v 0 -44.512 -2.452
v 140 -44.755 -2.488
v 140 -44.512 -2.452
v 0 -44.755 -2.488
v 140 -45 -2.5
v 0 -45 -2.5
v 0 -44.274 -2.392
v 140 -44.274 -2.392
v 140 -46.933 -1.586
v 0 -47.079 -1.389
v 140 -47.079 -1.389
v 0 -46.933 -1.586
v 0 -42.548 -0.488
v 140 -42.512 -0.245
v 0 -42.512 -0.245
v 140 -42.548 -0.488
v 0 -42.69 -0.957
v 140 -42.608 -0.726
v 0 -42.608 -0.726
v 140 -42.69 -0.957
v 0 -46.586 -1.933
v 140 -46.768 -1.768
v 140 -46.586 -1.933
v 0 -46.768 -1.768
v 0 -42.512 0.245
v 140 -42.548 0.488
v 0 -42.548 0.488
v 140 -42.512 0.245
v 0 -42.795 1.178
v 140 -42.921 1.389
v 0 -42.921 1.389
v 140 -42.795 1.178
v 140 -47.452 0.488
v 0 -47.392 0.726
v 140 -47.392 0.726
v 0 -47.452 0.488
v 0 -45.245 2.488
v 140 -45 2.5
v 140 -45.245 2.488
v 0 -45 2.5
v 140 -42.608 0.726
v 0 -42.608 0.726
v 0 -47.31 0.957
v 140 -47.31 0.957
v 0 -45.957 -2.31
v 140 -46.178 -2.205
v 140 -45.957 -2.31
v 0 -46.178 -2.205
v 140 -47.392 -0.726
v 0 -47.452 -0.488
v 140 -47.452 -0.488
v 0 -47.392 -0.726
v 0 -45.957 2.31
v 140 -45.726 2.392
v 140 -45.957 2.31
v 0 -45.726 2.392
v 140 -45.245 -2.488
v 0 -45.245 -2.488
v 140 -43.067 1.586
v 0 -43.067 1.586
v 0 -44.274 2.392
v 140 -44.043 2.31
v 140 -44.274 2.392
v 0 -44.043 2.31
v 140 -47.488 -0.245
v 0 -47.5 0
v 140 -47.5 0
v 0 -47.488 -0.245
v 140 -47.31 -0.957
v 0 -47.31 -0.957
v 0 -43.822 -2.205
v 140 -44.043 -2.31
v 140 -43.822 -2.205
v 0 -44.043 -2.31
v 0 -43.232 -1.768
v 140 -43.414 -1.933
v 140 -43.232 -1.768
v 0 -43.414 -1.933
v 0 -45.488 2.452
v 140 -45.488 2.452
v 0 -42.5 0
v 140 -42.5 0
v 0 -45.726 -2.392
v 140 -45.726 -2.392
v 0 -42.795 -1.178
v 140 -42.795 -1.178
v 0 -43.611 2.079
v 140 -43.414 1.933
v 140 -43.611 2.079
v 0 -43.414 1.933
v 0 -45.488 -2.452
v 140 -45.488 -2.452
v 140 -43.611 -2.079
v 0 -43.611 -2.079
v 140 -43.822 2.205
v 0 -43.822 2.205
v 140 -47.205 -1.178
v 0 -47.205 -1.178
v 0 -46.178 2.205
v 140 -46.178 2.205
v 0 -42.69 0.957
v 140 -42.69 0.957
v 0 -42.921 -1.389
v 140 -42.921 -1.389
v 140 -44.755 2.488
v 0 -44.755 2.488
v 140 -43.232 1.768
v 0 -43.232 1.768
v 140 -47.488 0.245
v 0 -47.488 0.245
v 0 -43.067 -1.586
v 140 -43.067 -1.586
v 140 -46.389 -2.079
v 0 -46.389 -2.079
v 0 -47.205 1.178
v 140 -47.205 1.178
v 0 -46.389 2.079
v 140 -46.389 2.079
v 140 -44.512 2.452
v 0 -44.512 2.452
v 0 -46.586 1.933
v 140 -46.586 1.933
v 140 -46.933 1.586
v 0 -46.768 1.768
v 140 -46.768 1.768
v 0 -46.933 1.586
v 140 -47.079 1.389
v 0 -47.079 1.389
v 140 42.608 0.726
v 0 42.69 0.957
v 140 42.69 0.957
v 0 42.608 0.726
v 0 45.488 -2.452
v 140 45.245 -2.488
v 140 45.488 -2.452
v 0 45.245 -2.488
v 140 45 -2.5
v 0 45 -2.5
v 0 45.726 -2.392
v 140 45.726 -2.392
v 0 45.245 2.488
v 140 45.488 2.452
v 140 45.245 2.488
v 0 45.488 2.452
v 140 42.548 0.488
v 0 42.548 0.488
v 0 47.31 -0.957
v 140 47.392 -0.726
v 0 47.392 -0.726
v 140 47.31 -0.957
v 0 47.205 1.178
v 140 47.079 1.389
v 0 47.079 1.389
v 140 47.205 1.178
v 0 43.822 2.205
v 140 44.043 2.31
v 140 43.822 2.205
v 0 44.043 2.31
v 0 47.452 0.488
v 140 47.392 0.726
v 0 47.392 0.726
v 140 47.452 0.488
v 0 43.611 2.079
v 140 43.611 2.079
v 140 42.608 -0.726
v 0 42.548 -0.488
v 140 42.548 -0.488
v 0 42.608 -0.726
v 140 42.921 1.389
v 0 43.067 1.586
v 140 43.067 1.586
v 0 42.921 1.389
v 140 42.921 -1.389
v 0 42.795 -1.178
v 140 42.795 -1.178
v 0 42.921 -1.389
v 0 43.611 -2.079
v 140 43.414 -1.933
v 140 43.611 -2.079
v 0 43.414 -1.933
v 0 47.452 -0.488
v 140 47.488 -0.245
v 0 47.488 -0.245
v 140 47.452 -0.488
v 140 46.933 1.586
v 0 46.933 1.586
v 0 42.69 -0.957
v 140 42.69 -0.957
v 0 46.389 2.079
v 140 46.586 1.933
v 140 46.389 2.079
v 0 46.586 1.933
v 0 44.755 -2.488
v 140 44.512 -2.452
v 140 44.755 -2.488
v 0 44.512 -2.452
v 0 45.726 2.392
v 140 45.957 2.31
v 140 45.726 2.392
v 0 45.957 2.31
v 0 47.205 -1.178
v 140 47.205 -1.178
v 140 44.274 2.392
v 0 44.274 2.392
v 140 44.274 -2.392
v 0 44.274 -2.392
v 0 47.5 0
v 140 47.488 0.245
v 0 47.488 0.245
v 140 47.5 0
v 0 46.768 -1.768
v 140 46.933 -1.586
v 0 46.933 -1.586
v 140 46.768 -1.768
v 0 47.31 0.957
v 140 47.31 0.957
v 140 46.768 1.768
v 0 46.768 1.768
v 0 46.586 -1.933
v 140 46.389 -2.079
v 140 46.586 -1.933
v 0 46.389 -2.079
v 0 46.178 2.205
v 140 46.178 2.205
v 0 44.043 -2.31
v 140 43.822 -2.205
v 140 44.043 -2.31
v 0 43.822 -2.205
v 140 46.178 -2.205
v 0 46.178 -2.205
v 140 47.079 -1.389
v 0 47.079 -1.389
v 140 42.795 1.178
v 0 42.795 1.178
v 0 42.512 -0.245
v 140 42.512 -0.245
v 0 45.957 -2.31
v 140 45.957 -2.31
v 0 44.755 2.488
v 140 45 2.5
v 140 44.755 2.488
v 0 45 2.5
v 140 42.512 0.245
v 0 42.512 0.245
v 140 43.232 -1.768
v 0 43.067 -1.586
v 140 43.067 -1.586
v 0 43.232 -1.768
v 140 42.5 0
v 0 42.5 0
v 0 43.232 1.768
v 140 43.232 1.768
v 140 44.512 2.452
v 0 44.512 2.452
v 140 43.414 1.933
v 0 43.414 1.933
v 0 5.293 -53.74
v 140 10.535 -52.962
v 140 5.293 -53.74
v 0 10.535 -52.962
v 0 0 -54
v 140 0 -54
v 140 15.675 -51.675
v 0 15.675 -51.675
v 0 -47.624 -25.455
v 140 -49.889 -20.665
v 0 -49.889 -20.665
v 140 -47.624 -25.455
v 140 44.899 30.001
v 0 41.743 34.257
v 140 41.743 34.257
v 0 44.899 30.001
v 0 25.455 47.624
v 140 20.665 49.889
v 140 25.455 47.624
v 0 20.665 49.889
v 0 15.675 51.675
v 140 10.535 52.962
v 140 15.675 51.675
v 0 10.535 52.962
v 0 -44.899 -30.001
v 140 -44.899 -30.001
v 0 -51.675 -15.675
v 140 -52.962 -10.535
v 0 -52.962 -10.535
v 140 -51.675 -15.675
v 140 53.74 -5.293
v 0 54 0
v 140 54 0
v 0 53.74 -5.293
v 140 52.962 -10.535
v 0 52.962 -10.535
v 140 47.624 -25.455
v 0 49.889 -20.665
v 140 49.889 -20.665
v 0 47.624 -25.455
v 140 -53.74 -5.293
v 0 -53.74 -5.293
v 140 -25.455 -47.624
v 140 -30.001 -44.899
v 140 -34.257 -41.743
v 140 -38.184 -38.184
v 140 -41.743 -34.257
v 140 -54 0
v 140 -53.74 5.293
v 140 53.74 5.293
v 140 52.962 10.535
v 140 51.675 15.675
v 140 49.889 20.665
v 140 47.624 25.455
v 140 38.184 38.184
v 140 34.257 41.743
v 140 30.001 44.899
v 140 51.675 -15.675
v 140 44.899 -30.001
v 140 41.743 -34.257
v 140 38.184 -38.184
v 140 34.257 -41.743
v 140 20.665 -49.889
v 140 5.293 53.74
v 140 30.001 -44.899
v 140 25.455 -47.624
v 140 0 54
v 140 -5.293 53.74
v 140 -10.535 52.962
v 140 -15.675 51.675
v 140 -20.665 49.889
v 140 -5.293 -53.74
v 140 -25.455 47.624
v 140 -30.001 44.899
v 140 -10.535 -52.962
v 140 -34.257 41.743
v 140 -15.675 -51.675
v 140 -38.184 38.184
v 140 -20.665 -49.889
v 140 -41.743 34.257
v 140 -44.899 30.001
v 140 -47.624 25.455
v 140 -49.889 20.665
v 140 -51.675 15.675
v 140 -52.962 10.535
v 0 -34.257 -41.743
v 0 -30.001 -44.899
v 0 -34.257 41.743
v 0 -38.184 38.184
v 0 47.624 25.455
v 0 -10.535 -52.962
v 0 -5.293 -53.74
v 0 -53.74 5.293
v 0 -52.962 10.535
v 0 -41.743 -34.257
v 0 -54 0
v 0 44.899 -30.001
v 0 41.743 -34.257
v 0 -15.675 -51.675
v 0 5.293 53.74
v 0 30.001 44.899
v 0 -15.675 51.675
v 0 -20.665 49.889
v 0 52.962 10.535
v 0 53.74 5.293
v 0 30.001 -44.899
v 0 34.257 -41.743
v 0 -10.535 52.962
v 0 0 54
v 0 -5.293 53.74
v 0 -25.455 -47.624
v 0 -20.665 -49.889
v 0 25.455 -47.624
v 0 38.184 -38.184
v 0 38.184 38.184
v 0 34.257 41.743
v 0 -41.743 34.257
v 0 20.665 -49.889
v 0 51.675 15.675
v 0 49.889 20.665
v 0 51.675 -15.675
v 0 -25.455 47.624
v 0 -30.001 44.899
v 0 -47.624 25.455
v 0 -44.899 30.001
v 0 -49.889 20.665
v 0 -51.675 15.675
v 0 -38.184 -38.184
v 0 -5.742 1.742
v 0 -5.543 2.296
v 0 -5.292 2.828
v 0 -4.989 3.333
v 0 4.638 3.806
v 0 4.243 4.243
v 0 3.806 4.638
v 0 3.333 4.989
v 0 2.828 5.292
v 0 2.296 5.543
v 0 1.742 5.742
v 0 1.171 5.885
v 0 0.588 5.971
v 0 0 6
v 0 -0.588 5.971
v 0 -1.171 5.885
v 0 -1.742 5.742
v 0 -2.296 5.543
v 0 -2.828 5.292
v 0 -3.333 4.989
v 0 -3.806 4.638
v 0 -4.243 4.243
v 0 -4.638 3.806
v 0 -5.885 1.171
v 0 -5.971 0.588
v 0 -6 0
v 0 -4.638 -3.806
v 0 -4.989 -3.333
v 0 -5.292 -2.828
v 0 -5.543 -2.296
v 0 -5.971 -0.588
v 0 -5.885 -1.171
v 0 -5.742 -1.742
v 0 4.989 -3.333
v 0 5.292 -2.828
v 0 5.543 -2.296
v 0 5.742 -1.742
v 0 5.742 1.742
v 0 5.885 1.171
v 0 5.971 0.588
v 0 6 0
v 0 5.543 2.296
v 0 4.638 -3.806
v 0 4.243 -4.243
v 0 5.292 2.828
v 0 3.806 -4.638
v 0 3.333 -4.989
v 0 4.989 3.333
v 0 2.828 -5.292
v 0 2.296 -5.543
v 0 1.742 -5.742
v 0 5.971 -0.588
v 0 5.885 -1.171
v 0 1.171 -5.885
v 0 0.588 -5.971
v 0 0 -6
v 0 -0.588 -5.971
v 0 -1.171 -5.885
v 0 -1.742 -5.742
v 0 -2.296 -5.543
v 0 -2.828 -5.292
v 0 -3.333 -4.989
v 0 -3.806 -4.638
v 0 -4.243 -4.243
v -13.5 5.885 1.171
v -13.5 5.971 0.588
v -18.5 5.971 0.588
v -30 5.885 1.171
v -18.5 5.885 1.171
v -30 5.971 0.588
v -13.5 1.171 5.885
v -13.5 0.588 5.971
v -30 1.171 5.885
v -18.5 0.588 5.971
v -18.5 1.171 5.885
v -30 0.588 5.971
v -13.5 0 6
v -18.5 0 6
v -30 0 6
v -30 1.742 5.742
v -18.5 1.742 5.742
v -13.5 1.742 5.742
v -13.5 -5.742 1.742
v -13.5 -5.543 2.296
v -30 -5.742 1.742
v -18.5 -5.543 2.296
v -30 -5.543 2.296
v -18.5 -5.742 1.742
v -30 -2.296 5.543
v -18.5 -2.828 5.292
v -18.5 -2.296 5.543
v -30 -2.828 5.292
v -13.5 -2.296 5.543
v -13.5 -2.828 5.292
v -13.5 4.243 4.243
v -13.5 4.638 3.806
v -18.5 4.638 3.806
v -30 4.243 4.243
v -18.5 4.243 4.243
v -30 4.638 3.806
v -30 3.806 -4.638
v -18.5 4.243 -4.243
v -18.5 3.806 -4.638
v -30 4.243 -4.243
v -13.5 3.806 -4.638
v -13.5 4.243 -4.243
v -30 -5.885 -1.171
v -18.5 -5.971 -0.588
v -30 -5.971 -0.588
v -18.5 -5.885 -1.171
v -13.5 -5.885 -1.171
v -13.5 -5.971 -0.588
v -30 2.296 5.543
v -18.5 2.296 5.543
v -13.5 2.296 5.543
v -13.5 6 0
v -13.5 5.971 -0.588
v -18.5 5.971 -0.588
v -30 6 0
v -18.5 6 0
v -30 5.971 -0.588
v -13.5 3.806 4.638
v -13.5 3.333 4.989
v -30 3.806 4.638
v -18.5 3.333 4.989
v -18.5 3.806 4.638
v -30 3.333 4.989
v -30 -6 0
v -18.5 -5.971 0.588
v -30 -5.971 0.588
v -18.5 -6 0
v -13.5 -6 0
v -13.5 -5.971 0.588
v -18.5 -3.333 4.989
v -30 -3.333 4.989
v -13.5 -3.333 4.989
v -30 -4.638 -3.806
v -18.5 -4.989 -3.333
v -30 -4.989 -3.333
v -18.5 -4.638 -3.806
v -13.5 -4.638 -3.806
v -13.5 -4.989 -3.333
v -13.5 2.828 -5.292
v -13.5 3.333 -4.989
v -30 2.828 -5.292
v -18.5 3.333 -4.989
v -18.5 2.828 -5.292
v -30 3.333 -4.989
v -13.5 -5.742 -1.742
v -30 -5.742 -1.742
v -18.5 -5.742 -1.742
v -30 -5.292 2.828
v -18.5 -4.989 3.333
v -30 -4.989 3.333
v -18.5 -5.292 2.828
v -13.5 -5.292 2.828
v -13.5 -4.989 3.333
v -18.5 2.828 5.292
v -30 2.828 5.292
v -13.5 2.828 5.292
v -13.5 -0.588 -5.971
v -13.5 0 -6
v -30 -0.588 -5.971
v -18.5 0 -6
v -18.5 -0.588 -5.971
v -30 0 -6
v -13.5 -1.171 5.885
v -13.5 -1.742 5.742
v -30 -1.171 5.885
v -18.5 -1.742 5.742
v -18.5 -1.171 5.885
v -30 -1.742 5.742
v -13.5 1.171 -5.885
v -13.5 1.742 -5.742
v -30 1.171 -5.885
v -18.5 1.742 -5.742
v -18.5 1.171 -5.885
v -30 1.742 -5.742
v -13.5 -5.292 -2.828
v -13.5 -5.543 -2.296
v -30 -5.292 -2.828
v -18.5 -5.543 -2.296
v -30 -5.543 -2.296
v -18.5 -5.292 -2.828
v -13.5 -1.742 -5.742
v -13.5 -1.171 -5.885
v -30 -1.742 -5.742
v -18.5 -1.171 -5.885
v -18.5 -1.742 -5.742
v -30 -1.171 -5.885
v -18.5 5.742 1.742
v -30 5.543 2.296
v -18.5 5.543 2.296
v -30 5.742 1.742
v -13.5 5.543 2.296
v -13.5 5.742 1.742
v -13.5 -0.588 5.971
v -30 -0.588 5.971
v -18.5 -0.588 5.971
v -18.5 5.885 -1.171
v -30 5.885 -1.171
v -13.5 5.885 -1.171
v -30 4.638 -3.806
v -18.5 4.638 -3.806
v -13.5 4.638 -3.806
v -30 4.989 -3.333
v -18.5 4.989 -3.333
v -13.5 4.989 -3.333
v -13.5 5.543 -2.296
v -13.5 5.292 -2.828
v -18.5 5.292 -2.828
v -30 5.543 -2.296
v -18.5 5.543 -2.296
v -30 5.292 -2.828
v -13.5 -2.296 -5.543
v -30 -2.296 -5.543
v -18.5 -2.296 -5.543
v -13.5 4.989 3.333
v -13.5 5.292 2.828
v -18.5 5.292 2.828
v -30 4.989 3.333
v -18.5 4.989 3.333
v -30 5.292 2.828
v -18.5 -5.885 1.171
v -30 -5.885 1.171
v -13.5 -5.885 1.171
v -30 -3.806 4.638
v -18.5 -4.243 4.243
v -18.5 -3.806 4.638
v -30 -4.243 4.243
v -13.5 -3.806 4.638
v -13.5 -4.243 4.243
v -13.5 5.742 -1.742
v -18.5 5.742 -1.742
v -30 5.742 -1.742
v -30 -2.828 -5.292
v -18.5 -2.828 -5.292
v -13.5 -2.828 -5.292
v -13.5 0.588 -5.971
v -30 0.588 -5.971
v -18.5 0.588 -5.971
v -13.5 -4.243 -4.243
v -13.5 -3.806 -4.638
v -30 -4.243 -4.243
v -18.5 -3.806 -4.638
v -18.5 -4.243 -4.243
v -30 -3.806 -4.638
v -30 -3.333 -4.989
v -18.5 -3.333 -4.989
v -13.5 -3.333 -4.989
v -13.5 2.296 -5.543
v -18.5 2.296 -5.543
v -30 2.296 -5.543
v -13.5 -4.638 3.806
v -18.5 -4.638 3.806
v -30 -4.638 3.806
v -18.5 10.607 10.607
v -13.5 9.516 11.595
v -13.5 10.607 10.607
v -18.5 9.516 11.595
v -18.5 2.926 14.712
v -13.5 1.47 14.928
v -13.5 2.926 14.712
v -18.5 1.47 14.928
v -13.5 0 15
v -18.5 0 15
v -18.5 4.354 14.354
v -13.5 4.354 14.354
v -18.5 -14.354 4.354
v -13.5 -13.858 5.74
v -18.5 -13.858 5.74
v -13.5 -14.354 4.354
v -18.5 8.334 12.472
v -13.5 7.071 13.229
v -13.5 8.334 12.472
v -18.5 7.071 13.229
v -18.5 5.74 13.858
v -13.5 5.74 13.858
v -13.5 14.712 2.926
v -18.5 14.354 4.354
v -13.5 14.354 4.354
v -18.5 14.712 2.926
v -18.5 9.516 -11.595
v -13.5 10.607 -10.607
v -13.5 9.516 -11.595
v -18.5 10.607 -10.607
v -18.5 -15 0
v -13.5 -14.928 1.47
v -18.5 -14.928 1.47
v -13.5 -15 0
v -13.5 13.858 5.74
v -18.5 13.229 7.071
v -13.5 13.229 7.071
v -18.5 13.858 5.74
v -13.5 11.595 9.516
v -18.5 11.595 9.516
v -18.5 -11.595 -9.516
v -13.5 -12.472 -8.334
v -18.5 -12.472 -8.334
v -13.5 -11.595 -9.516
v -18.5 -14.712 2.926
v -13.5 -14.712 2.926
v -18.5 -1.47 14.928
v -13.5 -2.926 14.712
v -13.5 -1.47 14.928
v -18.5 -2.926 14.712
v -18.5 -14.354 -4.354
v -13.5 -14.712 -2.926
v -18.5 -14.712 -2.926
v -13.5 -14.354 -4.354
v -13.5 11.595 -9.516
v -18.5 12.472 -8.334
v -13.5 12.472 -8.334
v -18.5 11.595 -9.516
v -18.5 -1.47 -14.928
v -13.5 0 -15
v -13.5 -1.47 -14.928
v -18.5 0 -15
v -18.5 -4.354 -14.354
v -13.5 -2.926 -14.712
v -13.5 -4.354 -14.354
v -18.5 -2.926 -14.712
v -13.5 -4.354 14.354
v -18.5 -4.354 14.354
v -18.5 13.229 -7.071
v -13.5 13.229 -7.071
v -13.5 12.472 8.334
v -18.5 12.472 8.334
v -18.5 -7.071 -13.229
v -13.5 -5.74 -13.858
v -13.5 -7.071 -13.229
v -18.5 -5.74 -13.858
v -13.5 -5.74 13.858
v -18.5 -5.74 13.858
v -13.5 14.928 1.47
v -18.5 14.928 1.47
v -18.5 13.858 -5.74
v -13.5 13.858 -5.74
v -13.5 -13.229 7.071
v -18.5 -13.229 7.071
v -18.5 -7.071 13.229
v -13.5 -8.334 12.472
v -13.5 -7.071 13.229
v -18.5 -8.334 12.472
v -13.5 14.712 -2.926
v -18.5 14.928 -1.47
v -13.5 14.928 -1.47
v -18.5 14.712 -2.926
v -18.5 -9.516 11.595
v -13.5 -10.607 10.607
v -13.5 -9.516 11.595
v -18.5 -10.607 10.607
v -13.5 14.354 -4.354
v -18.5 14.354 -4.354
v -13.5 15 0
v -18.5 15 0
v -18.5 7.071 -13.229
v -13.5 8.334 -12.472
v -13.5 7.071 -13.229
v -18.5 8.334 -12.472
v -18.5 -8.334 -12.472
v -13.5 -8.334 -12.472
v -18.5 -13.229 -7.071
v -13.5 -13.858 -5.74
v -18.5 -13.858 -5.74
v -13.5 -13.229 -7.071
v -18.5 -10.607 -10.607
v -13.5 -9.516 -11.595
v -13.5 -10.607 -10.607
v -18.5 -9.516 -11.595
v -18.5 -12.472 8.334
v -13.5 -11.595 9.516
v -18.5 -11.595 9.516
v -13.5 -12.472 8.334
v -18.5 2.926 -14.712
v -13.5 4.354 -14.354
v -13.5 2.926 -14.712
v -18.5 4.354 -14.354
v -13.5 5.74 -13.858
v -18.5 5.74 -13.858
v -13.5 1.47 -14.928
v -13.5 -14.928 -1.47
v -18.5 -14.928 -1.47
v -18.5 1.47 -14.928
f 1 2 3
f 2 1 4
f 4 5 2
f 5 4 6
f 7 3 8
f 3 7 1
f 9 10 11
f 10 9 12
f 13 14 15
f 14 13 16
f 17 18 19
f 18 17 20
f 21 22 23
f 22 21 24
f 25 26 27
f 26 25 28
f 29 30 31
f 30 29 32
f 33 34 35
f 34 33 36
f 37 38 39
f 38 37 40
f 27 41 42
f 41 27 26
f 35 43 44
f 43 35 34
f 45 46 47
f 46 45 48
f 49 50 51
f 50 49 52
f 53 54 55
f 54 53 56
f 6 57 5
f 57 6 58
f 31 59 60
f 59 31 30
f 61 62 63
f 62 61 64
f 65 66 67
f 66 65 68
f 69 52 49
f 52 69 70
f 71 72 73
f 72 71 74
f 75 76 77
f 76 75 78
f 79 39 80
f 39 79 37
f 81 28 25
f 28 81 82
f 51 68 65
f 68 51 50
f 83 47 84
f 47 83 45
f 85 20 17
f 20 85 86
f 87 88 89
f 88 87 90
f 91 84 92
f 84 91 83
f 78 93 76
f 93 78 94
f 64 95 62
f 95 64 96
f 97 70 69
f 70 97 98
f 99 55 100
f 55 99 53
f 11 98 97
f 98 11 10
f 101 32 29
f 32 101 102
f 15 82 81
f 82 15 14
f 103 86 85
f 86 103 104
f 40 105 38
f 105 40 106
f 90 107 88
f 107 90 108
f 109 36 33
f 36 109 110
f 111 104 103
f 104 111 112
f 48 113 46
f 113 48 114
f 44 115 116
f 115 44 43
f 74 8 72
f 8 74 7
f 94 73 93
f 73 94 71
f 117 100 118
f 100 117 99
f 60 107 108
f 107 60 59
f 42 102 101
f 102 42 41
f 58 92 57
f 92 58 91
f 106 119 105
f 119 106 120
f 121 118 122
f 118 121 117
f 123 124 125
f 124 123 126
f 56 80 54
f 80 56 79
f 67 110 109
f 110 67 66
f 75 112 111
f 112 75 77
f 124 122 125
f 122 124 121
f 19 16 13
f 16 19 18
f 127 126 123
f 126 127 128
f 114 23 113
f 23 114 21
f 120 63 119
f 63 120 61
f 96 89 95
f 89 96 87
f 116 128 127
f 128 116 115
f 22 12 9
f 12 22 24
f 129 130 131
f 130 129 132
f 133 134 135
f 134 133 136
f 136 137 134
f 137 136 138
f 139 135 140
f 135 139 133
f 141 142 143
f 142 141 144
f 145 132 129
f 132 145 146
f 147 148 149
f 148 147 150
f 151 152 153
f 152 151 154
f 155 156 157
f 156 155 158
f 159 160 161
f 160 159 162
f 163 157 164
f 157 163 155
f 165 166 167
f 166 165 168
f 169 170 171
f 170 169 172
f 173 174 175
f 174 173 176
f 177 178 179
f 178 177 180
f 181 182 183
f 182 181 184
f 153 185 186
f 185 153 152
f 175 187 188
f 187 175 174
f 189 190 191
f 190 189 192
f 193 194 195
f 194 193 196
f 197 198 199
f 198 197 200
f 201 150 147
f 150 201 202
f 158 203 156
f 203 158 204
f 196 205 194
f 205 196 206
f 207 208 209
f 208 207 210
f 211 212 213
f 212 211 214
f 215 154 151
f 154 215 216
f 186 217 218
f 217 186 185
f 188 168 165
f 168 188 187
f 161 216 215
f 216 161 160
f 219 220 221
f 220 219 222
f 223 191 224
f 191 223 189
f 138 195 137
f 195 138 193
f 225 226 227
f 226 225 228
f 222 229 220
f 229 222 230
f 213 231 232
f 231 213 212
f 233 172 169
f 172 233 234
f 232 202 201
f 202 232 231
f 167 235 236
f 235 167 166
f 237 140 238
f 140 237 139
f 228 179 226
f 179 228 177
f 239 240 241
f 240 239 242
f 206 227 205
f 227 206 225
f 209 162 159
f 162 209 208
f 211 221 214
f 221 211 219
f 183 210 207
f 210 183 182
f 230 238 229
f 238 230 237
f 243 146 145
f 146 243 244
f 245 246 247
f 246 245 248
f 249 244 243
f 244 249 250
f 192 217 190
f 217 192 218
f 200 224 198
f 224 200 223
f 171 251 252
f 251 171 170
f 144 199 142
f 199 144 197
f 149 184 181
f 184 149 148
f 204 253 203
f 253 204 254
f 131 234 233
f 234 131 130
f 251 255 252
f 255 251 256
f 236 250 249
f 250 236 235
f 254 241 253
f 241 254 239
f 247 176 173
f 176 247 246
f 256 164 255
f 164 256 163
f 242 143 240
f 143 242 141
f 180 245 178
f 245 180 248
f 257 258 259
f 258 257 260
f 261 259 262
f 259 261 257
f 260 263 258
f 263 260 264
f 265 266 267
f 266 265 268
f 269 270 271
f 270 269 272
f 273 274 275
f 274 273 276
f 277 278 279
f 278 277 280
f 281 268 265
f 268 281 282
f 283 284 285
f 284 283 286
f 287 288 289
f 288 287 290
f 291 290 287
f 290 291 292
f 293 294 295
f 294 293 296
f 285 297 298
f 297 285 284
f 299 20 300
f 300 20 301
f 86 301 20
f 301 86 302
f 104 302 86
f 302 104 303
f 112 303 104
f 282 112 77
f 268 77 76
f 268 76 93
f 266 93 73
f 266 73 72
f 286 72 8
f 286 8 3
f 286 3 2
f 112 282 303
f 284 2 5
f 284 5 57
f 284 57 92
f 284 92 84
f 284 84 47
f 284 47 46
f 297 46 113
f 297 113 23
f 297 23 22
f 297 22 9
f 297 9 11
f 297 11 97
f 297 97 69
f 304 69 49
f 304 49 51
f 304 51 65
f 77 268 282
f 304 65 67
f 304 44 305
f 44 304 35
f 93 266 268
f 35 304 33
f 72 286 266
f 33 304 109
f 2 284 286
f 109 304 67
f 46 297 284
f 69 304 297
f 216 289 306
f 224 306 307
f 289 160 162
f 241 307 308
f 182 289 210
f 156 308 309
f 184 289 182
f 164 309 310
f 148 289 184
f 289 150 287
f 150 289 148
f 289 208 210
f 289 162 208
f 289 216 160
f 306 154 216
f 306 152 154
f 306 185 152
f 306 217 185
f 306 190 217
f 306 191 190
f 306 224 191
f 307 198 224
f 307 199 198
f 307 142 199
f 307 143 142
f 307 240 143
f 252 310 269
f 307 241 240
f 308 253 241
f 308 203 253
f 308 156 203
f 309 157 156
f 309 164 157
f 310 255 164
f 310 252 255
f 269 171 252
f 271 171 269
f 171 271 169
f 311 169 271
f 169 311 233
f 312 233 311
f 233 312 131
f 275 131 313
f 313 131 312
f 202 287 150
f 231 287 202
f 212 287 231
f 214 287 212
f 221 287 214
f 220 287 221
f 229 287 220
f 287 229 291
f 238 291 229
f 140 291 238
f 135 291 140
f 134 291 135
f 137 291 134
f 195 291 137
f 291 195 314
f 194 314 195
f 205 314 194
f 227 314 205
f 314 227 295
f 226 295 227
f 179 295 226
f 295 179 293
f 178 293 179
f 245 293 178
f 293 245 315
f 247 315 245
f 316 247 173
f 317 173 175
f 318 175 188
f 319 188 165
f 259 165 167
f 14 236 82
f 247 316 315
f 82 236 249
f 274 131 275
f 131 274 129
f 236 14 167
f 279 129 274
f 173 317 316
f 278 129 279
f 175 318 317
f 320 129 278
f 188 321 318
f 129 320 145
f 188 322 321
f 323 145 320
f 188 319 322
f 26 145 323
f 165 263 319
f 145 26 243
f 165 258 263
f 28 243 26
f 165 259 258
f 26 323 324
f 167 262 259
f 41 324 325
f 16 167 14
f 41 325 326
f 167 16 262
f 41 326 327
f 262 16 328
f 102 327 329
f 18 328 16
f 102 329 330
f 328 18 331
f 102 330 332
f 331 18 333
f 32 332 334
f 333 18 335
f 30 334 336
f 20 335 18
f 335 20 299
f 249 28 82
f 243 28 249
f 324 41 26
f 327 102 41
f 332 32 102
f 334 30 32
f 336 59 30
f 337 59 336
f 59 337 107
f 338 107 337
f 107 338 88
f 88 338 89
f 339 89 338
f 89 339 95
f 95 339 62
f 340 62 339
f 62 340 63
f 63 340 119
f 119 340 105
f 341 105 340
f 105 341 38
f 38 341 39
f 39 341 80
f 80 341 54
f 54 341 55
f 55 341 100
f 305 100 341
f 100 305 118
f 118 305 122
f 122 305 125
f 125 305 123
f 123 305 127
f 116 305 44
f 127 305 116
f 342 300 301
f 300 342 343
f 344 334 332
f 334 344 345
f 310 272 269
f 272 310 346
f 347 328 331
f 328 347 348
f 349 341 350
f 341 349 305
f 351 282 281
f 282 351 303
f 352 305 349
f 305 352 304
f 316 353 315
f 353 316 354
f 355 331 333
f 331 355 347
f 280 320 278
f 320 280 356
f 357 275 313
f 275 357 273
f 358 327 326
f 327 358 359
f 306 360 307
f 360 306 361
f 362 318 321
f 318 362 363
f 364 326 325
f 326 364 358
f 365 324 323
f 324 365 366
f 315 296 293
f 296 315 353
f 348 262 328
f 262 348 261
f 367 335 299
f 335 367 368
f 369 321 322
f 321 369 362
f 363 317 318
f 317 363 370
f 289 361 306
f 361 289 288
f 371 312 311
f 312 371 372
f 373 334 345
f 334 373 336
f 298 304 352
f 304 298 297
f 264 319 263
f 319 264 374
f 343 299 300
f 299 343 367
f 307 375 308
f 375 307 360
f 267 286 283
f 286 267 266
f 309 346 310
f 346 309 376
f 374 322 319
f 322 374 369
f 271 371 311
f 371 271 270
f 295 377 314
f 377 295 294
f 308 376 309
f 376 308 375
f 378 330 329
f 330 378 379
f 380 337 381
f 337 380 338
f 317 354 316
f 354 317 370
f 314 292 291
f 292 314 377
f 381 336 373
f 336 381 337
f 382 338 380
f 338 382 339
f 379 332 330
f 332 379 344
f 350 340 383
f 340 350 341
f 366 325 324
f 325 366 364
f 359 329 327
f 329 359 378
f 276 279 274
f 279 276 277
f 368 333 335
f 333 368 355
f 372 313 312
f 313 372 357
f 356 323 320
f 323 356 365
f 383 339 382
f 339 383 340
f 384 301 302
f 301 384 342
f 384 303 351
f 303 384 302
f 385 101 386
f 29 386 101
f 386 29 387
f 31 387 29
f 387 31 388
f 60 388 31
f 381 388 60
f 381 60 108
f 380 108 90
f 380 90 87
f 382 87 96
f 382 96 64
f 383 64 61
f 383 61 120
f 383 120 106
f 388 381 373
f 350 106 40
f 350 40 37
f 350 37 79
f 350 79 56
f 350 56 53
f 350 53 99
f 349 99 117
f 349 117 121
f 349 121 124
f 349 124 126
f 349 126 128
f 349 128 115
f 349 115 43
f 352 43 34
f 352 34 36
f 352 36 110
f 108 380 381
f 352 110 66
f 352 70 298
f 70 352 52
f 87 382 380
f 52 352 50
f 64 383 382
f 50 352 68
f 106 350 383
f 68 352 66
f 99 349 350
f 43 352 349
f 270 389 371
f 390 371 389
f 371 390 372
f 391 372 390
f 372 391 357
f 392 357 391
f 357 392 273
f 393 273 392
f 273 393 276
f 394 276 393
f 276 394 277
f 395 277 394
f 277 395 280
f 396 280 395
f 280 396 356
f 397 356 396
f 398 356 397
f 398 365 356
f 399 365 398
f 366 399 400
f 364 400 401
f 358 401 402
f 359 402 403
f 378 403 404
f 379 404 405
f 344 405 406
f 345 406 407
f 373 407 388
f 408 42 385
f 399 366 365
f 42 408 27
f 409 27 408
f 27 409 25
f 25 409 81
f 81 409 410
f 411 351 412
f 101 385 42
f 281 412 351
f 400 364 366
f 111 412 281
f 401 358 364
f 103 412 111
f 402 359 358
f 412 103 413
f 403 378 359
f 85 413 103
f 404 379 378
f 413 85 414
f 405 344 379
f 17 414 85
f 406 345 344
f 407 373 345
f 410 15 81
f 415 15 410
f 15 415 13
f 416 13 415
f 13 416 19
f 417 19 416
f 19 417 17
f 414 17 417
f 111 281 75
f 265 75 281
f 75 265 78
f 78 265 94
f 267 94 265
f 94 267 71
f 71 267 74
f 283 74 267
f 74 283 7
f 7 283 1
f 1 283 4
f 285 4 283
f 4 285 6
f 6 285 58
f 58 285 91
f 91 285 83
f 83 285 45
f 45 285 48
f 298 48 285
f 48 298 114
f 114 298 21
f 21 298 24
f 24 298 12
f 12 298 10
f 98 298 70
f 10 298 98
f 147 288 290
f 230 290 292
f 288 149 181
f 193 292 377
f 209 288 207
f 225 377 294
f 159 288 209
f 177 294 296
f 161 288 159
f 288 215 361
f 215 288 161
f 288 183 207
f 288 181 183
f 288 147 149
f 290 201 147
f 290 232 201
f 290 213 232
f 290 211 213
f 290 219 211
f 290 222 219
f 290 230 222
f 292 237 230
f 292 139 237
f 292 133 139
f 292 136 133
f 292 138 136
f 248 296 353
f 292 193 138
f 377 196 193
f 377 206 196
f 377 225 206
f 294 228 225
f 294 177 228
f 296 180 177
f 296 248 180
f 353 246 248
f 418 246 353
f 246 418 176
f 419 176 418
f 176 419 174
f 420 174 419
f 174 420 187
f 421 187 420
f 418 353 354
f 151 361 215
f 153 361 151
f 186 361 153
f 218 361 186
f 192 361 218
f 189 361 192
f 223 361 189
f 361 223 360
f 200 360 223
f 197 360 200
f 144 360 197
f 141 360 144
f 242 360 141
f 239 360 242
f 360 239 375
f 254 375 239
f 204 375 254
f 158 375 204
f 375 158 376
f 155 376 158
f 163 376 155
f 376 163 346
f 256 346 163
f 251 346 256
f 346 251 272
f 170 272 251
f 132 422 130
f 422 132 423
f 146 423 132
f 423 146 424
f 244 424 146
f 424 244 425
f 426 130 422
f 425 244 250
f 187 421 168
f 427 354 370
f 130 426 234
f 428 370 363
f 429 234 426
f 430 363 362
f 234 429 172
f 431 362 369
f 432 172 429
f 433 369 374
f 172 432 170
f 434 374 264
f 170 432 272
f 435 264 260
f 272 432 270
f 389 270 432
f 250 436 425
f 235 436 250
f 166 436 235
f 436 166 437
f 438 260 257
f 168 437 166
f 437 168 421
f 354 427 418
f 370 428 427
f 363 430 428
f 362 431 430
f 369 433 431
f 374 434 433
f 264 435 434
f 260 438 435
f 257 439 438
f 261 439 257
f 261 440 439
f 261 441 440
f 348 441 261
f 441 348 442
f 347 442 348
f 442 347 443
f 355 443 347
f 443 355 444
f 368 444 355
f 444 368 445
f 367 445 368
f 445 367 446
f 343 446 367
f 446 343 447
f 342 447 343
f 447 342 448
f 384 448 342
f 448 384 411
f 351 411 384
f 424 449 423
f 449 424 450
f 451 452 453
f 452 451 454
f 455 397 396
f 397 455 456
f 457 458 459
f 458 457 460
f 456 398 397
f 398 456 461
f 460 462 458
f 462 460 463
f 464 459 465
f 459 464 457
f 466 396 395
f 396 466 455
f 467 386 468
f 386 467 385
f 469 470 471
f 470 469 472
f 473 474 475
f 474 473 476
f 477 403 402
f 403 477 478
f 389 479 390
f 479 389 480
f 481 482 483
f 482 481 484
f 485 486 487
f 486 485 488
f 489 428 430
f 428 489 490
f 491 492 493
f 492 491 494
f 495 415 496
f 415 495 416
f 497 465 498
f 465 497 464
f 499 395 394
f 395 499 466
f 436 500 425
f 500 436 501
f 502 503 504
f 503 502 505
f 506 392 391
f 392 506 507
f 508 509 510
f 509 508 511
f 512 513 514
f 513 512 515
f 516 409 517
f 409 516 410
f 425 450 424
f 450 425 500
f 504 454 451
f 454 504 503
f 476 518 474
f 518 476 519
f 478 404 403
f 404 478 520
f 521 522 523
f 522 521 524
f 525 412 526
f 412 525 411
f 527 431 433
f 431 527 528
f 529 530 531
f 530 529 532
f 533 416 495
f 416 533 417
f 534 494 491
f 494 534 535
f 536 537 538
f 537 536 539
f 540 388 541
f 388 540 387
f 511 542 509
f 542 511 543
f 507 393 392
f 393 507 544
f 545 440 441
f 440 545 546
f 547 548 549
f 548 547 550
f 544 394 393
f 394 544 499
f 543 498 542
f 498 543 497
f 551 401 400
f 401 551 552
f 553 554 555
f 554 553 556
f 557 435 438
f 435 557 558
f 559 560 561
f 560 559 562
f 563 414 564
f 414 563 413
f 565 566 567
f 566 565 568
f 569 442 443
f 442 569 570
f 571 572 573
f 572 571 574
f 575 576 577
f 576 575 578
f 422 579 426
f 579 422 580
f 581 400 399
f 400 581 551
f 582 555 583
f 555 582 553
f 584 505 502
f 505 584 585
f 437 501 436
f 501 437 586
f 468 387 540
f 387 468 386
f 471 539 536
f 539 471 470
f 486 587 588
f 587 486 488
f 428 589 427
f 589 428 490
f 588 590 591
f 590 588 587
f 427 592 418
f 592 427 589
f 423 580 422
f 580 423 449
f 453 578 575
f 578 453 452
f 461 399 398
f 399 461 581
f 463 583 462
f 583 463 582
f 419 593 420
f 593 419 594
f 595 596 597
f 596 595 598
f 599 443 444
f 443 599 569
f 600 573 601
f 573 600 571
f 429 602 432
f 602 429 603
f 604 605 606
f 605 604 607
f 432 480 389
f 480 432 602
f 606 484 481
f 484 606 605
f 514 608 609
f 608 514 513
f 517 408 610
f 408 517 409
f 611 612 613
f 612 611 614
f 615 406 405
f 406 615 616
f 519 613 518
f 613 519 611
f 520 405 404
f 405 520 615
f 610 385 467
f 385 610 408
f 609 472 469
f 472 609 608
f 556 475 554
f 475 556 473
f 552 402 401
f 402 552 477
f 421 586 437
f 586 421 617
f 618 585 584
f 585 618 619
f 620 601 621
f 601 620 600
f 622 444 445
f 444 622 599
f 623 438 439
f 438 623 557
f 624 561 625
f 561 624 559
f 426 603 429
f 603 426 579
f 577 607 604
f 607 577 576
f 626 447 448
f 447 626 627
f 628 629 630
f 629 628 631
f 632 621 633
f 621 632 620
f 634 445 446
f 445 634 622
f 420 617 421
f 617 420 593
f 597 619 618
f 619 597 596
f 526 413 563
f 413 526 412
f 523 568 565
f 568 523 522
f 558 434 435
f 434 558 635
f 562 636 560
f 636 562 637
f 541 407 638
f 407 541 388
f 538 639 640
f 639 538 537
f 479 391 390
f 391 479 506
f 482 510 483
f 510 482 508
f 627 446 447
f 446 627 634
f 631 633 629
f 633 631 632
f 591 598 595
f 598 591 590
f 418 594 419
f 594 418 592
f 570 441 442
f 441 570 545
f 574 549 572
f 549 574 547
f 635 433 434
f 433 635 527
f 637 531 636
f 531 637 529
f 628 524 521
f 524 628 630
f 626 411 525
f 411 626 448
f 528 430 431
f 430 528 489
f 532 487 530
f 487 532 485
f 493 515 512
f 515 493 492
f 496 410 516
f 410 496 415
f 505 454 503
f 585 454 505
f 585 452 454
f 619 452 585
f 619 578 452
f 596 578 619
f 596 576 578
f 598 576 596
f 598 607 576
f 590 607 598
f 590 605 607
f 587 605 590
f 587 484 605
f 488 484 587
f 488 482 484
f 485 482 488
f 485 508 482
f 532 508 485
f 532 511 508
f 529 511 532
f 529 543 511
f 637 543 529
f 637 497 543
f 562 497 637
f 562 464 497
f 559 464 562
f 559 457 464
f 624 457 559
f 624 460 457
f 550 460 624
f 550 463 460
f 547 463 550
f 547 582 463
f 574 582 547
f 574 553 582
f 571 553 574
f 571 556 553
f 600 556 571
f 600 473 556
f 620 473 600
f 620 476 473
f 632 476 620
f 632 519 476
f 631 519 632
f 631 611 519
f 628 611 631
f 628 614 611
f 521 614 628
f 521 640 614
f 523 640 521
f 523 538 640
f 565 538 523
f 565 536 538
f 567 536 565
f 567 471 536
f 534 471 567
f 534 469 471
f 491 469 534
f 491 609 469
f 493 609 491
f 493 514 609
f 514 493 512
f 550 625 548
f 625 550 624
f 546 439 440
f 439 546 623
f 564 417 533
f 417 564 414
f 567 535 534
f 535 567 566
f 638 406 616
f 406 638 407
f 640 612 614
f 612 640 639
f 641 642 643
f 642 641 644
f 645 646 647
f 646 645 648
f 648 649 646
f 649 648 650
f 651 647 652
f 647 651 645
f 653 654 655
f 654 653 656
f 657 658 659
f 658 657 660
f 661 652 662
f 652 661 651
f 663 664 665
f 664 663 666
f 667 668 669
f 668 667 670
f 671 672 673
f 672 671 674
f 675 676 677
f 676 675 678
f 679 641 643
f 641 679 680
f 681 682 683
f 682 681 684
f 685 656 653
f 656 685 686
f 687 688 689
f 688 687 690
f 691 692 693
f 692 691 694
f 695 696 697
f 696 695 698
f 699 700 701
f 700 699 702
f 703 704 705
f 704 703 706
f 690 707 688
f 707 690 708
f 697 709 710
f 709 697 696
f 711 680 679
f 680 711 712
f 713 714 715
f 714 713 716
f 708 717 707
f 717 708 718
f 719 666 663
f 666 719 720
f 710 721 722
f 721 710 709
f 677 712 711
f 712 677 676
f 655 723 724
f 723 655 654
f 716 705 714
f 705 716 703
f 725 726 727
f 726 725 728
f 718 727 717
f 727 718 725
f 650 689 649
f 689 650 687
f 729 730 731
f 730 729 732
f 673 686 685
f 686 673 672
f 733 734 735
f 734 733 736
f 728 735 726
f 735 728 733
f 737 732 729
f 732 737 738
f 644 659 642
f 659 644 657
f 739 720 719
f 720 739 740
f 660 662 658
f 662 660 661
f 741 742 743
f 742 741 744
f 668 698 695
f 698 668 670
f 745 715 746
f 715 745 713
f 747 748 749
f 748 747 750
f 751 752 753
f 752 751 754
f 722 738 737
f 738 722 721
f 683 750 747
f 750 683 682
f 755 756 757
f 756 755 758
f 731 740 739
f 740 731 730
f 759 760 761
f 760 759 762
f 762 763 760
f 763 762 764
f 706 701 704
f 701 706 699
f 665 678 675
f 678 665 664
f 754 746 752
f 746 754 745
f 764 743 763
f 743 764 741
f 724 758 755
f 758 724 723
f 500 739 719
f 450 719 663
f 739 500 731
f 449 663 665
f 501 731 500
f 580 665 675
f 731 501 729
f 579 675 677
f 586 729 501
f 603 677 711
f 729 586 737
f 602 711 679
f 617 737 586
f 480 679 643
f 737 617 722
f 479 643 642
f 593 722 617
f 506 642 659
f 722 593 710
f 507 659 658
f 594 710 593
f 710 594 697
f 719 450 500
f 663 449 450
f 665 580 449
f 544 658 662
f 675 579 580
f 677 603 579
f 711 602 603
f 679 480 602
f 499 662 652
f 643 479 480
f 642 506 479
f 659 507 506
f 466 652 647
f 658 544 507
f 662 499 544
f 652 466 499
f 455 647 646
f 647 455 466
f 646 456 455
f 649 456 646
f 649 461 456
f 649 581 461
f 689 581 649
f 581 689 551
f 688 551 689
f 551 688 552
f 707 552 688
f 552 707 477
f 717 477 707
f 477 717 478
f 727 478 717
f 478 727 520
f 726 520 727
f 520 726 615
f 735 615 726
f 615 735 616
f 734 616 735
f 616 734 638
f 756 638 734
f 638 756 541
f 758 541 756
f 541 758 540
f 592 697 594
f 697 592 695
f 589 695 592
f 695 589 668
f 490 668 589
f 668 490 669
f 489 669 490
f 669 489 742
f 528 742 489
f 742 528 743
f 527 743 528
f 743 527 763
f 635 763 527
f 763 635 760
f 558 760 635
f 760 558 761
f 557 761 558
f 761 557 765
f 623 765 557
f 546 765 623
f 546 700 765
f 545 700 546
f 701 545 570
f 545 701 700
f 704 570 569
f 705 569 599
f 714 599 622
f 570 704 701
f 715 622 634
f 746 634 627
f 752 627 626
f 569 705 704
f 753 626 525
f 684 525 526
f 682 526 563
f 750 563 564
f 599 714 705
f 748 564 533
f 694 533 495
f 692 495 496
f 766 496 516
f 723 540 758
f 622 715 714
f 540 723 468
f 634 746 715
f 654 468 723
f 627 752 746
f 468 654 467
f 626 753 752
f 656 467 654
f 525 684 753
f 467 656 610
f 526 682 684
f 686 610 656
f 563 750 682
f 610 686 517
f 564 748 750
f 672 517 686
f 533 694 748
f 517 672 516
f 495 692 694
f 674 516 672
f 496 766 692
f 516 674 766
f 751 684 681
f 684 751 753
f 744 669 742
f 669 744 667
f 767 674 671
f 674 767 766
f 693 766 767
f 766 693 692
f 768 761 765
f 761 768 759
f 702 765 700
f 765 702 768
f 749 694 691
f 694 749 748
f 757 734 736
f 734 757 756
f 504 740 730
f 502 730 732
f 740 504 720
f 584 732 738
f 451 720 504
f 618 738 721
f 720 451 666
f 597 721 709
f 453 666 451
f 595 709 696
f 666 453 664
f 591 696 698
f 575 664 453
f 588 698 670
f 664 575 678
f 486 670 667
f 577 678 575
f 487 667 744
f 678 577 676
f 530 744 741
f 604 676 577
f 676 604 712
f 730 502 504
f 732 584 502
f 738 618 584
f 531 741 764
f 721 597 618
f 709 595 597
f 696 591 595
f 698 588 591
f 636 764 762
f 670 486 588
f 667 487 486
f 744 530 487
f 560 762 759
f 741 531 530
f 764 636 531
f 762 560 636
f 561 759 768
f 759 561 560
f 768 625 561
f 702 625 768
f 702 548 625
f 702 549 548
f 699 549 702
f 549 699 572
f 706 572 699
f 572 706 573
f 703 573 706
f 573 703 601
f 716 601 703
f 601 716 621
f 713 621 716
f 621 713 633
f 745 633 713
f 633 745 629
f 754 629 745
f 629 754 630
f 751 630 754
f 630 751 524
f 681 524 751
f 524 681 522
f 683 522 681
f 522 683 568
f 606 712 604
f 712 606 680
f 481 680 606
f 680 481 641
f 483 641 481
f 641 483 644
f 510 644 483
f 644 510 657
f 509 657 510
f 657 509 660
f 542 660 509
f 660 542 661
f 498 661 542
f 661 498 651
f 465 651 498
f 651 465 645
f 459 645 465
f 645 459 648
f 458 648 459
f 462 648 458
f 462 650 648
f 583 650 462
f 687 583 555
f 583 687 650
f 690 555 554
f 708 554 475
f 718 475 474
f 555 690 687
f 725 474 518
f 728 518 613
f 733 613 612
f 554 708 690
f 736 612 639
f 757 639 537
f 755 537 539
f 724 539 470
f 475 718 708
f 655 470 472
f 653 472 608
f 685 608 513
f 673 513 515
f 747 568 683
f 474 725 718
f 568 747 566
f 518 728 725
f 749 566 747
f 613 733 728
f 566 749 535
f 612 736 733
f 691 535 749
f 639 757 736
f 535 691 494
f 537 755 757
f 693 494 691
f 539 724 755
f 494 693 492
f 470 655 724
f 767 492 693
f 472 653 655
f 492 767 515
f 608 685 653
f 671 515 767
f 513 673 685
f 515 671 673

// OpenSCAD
module Motor()
{
  $fn=64;

  body_length = 140;
  body_diameter = 108;

  shaft_diameter = 12;
  shaft_length = 30;

  sprocket_diameter = 30;
  sprocket_pos = 16;

  mounting_hole_centres = 90;

  rotate([0, 90, 0])
  {
    /* Body */
    color("orange")
    {
      difference()
      {
        cylinder(d=body_diameter, h=body_length);

        /* Mounting holes */
        for(y = [-mounting_hole_centres/2, mounting_hole_centres/2])
        {
          translate([0, y, -1])
          {
            cylinder(d=5, h=body_length+2);
          }
        }
      }
    }
  }

  rotate([0, -90, 0])
  {
    /* Shaft */
    color("black")
    {
      cylinder(d=shaft_diameter, h=shaft_length);
    }

    translate([0, 0, sprocket_pos])
    {
      color("cyan")
      {
        cylinder(d=sprocket_diameter, h=5, center=true);
      }
    }
  }
}

Motor();
